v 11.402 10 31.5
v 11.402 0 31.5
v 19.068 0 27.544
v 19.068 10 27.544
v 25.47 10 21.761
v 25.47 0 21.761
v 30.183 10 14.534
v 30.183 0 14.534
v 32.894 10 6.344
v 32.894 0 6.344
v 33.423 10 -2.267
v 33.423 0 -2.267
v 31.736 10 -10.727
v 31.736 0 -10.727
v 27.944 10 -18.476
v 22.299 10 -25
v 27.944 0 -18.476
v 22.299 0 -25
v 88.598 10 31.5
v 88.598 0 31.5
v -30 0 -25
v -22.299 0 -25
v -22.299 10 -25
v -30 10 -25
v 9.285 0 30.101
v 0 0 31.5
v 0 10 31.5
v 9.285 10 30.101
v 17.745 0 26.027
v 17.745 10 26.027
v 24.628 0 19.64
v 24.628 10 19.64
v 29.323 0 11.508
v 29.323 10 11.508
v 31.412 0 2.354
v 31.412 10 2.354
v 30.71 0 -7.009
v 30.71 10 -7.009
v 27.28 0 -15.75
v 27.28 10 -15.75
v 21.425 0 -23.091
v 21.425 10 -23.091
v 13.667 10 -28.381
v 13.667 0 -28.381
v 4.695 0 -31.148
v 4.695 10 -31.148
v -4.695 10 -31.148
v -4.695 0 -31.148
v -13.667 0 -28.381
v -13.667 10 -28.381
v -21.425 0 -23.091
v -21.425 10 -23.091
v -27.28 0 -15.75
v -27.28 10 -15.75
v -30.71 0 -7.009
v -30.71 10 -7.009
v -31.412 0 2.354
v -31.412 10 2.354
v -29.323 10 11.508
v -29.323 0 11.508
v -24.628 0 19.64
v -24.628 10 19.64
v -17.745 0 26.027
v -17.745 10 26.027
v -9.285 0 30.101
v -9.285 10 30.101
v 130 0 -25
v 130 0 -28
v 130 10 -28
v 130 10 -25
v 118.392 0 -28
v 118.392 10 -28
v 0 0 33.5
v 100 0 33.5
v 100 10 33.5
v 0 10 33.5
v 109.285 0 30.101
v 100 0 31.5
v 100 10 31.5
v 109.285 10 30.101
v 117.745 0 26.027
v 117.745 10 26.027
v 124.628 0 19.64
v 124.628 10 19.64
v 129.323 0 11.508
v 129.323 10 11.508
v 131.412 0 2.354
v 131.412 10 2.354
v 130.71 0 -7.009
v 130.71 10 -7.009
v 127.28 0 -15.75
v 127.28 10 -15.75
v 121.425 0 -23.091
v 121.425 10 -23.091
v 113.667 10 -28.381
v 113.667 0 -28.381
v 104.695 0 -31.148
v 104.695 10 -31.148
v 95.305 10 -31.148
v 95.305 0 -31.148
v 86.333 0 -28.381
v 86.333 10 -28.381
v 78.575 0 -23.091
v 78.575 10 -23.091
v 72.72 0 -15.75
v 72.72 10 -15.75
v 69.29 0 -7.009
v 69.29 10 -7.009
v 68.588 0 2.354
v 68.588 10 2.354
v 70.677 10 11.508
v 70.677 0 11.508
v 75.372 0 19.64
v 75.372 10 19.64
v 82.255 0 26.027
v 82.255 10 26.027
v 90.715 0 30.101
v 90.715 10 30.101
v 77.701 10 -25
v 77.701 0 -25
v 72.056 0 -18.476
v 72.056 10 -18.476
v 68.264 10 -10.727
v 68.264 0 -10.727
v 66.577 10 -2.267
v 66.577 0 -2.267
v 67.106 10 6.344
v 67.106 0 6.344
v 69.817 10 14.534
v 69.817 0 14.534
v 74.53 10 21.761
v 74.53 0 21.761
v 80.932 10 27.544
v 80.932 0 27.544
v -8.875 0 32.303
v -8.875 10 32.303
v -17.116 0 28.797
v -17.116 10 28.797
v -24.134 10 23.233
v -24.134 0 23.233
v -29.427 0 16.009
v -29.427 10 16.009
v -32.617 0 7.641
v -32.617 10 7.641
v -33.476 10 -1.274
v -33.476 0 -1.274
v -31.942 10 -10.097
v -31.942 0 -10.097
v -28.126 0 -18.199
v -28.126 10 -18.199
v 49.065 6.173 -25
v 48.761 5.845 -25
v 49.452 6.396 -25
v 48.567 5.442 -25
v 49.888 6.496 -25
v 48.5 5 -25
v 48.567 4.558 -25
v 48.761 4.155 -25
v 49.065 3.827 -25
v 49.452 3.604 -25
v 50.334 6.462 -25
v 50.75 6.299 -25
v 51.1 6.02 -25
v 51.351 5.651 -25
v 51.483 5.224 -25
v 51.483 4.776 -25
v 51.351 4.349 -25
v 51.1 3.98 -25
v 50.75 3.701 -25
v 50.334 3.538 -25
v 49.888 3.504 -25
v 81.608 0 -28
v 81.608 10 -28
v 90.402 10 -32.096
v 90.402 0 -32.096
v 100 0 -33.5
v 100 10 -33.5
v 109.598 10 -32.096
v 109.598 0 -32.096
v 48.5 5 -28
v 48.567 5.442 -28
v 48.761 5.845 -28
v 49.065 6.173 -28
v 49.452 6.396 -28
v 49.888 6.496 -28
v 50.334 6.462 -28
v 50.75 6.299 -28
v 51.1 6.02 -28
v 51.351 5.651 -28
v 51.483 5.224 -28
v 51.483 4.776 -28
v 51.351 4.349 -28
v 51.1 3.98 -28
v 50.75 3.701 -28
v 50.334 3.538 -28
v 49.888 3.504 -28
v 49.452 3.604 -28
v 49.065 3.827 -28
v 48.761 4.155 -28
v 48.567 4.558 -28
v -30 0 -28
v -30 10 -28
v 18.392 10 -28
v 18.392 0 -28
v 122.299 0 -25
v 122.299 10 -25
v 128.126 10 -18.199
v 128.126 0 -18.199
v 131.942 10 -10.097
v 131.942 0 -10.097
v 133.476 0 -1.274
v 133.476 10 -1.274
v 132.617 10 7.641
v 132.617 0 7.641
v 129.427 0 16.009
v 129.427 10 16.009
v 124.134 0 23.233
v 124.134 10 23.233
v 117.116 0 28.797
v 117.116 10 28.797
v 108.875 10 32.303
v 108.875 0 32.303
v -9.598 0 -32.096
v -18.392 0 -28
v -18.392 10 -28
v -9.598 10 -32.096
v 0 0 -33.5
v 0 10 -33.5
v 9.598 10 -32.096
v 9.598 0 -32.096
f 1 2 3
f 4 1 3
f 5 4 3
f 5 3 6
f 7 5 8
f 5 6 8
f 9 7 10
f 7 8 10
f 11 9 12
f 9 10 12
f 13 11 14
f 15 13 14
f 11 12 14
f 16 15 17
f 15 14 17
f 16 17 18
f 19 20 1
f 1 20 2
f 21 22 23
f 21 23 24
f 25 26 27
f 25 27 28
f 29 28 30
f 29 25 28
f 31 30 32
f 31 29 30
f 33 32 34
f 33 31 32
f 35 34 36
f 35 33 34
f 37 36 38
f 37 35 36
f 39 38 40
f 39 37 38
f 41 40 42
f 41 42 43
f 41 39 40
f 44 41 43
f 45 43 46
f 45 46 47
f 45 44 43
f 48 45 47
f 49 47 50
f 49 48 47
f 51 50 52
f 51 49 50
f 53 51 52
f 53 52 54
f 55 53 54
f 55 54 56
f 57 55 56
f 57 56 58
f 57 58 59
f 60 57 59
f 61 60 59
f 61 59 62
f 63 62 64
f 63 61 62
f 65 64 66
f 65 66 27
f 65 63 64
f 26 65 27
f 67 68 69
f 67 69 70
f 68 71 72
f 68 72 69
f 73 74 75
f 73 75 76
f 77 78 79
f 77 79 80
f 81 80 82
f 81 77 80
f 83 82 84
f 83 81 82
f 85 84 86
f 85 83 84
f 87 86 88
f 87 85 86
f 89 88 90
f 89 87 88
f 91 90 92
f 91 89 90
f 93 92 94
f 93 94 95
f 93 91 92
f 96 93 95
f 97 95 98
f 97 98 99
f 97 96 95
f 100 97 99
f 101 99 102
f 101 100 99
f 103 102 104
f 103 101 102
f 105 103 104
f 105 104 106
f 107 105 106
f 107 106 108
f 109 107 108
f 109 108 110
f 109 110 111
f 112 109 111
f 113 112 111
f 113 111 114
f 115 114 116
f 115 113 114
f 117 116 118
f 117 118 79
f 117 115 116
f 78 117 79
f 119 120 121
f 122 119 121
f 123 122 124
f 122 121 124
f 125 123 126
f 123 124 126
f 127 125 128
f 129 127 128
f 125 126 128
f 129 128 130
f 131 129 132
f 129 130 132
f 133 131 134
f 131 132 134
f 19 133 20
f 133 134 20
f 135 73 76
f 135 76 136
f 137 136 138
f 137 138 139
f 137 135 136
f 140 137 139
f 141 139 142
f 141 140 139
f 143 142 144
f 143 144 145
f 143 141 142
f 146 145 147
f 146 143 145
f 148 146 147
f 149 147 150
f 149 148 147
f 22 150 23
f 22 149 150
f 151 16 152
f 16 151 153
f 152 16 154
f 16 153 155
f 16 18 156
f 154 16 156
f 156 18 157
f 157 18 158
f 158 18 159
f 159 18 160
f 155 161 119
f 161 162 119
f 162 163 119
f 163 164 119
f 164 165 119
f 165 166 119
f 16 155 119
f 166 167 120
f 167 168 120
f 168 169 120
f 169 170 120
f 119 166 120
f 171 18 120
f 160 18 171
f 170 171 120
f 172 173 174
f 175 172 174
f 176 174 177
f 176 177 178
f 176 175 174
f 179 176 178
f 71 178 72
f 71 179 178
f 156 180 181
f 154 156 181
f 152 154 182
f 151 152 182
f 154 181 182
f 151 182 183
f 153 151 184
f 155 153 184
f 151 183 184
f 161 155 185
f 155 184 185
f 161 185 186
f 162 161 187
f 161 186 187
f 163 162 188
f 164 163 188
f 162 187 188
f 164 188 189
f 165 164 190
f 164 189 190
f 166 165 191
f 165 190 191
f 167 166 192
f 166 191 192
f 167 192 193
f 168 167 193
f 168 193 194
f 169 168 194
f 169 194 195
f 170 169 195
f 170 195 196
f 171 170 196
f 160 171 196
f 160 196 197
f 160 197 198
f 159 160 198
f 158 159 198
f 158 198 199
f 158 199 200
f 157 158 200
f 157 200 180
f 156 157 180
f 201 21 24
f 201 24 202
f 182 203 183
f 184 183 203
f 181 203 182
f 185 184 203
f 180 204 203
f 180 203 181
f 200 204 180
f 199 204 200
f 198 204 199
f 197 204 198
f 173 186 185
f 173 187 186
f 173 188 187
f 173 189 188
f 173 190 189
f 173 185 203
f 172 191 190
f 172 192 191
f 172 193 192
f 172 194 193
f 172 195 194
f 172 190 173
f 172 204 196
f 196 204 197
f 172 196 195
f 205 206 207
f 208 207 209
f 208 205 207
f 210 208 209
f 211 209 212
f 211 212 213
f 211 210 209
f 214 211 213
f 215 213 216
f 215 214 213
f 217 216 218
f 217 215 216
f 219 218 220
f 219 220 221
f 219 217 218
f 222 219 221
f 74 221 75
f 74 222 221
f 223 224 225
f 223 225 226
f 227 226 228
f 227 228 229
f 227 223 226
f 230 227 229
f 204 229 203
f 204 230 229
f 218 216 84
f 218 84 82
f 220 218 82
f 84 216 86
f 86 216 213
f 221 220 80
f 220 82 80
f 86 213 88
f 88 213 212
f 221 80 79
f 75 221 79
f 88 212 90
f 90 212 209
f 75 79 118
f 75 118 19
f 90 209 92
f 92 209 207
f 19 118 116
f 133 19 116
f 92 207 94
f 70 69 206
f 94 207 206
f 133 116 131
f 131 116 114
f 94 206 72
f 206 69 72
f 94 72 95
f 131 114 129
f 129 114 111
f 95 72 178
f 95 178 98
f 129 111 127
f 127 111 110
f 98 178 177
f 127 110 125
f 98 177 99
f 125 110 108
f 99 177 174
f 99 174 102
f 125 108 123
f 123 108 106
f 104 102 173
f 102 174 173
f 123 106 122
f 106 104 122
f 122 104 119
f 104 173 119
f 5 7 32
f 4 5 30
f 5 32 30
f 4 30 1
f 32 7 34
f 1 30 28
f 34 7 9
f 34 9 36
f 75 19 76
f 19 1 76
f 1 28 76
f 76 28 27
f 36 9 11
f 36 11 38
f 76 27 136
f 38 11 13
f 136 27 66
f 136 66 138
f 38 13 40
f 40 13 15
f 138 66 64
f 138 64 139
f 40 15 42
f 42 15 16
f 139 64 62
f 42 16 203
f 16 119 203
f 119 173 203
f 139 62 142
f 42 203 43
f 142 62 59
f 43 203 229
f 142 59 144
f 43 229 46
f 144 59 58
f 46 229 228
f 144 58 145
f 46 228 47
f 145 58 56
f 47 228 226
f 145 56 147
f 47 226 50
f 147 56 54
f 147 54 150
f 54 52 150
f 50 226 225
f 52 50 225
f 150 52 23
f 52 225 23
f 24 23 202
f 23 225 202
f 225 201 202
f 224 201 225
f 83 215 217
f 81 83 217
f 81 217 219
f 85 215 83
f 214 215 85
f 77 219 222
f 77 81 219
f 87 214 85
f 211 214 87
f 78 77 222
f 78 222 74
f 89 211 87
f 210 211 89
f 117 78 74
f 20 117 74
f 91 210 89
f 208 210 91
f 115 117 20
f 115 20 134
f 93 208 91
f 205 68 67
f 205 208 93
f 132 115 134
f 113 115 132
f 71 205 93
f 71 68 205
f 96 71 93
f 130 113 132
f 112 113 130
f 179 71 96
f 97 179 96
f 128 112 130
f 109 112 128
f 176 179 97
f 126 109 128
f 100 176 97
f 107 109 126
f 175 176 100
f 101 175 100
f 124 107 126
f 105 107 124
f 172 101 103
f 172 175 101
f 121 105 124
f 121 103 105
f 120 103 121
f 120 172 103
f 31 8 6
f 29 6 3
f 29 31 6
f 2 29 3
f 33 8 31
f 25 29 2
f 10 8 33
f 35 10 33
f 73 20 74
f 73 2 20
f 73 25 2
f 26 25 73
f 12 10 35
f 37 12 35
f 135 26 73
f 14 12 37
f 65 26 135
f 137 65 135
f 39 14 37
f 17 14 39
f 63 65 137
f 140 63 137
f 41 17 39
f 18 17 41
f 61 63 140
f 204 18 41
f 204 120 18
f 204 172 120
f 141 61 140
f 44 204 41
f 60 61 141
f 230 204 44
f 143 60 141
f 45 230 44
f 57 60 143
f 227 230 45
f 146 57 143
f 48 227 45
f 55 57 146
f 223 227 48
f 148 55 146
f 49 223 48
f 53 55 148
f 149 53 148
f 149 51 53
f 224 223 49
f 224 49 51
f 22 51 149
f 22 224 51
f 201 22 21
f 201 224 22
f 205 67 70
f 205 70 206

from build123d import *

# Parameters (mm, degrees)
SKETCH3_R           = 31.5
BOSS_EXTRUDE5_DEPTH = 10
SKETCH4_R           = 1.5
CUT_EXTRUDE1_DEPTH  = 22


with BuildPart() as part:
    # Sketch3 → Boss-Extrude5 (new body)
    with BuildSketch(Plane(origin=(0, 0, 0), x_dir=(1, 0, 0), z_dir=(0, 1, 0))):
        with BuildLine():
            Line((-30, 28), (-18.391574158, 28))
            ThreePointArc((-18.391574158, 28), (0, 33.5), (18.391574158, 28))
            Line((18.391574158, 28), (81.608425842, 28))
            ThreePointArc((81.608425842, 28), (100, 33.5), (118.391574158, 28))
            Line((118.391574158, 28), (130, 28))
            Line((130, 28), (130, 25))
            Line((130, 25), (122.299103121, 25))
            ThreePointArc((122.299103121, 25), (131.302955132, -11.932099564), (100, -33.5))
            Line((100, -33.5), (0, -33.5))
            ThreePointArc((0, -33.5), (-31.302955132, -11.932099564), (-22.299103121, 25))
            Line((-22.299103121, 25), (-30, 25))
            Line((-30, 25), (-30, 28))
        make_face()
        with Locations(Location((0, 0, 0), (0, 0, 270))):
            Circle(SKETCH3_R, mode=Mode.SUBTRACT)
        with Locations(Location((100, 0, 0), (0, 0, 270))):
            Circle(SKETCH3_R, mode=Mode.SUBTRACT)
        with BuildLine():
            Line((22.299103121, 25), (77.700896879, 25))
            ThreePointArc((77.700896879, 25), (67.106240001, -6.34433236), (88.598245749, -31.5))
            Line((88.598245749, -31.5), (11.401754251, -31.5))
            ThreePointArc((11.401754251, -31.5), (32.893759999, -6.34433236), (22.299103121, 25))
        make_face(mode=Mode.SUBTRACT)
    extrude(amount=BOSS_EXTRUDE5_DEPTH)

    # Sketch4 → Cut-Extrude1 (cut)
    with BuildSketch(Plane(origin=(0, 0, -28), x_dir=(-1, 0, 0), z_dir=(0, 0, -1))):
        with Locations((-50, 5)):
            Circle(SKETCH4_R)
    extrude(amount=-CUT_EXTRUDE1_DEPTH, mode=Mode.SUBTRACT)


solid = part.part
